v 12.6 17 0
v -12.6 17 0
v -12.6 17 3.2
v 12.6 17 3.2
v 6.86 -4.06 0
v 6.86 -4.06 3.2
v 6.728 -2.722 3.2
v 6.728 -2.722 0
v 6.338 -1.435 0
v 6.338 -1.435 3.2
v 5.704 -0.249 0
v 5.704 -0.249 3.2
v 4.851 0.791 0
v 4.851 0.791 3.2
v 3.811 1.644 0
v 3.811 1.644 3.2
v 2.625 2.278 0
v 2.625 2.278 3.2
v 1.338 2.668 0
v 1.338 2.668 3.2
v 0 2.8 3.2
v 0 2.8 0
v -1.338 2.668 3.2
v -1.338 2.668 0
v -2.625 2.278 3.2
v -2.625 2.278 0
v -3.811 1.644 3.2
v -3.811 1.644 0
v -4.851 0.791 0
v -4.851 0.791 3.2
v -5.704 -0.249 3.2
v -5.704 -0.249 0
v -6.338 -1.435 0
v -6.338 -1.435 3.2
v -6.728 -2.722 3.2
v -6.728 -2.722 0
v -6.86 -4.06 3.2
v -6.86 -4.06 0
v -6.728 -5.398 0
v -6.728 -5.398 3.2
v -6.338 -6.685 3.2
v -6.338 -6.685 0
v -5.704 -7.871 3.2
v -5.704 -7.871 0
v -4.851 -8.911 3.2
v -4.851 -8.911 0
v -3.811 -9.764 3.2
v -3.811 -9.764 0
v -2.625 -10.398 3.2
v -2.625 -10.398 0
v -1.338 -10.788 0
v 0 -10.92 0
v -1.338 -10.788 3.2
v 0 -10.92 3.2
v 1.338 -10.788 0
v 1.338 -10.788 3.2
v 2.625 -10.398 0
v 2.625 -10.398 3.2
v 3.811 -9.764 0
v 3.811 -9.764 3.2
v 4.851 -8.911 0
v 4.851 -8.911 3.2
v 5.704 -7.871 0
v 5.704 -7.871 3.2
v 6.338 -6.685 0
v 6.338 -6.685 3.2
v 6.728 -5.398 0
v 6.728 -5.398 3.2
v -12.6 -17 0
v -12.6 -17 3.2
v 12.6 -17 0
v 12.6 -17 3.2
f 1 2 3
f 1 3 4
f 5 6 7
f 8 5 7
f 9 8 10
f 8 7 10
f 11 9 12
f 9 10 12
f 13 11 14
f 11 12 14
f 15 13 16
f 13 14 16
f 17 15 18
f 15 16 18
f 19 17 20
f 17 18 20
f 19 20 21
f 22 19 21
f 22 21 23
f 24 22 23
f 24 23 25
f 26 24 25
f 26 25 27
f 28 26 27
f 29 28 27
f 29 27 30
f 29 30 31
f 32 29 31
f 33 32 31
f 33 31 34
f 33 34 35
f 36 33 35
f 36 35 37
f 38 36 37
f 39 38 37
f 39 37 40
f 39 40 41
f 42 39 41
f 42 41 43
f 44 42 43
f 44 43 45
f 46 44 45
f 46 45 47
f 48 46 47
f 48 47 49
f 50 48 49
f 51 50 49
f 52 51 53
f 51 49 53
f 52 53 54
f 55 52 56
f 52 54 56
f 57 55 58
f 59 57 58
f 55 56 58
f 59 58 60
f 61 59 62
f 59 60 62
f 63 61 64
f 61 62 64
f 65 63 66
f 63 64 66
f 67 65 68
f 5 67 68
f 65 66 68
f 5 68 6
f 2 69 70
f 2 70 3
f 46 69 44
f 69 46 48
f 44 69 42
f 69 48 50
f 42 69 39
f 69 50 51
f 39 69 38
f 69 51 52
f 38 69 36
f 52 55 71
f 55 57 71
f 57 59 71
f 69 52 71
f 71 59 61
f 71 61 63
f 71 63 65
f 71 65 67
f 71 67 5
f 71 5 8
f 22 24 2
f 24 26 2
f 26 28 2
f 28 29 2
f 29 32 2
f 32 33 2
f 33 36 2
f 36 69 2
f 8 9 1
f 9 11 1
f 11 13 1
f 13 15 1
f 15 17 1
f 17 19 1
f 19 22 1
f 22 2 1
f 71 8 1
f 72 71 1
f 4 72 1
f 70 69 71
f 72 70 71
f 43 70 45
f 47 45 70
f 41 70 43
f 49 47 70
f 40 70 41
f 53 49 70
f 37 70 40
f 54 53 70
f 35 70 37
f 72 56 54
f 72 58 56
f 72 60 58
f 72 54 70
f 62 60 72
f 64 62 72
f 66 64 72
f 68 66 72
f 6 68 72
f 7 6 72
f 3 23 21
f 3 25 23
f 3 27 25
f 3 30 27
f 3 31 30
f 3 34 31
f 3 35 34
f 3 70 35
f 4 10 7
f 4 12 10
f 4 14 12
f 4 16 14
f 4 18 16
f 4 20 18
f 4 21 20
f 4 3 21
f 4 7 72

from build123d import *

# Parameters (mm, degrees)
SKETCH1_W           = 25.2
SKETCH1_H           = 34
BOSS_EXTRUDE1_DEPTH = 3.2
CUT_EXTRUDE1_REACH  = 5.2
SKETCH4_R           = 6.86


with BuildPart() as part:
    # Sketch1 → Boss-Extrude1 (new body)
    with BuildSketch(Plane.XY):
        Rectangle(SKETCH1_W, SKETCH1_H)
    extrude(amount=BOSS_EXTRUDE1_DEPTH)

    # Sketch4 → Cut-Extrude1 (cut, up to next)
    with BuildSketch(Plane.XY.offset(3.2), mode=Mode.PRIVATE) as cut_extrude1_sk1:
        with Locations((0, -4.06)):
            Circle(SKETCH4_R)
    cut_extrude1_tool1 = extrude(cut_extrude1_sk1.sketch, amount=-CUT_EXTRUDE1_REACH, mode=Mode.PRIVATE) & part.part
    add(cut_extrude1_tool1.solids().sort_by_distance((0, -4.06, 3.2))[0], mode=Mode.SUBTRACT)


solid = part.part
